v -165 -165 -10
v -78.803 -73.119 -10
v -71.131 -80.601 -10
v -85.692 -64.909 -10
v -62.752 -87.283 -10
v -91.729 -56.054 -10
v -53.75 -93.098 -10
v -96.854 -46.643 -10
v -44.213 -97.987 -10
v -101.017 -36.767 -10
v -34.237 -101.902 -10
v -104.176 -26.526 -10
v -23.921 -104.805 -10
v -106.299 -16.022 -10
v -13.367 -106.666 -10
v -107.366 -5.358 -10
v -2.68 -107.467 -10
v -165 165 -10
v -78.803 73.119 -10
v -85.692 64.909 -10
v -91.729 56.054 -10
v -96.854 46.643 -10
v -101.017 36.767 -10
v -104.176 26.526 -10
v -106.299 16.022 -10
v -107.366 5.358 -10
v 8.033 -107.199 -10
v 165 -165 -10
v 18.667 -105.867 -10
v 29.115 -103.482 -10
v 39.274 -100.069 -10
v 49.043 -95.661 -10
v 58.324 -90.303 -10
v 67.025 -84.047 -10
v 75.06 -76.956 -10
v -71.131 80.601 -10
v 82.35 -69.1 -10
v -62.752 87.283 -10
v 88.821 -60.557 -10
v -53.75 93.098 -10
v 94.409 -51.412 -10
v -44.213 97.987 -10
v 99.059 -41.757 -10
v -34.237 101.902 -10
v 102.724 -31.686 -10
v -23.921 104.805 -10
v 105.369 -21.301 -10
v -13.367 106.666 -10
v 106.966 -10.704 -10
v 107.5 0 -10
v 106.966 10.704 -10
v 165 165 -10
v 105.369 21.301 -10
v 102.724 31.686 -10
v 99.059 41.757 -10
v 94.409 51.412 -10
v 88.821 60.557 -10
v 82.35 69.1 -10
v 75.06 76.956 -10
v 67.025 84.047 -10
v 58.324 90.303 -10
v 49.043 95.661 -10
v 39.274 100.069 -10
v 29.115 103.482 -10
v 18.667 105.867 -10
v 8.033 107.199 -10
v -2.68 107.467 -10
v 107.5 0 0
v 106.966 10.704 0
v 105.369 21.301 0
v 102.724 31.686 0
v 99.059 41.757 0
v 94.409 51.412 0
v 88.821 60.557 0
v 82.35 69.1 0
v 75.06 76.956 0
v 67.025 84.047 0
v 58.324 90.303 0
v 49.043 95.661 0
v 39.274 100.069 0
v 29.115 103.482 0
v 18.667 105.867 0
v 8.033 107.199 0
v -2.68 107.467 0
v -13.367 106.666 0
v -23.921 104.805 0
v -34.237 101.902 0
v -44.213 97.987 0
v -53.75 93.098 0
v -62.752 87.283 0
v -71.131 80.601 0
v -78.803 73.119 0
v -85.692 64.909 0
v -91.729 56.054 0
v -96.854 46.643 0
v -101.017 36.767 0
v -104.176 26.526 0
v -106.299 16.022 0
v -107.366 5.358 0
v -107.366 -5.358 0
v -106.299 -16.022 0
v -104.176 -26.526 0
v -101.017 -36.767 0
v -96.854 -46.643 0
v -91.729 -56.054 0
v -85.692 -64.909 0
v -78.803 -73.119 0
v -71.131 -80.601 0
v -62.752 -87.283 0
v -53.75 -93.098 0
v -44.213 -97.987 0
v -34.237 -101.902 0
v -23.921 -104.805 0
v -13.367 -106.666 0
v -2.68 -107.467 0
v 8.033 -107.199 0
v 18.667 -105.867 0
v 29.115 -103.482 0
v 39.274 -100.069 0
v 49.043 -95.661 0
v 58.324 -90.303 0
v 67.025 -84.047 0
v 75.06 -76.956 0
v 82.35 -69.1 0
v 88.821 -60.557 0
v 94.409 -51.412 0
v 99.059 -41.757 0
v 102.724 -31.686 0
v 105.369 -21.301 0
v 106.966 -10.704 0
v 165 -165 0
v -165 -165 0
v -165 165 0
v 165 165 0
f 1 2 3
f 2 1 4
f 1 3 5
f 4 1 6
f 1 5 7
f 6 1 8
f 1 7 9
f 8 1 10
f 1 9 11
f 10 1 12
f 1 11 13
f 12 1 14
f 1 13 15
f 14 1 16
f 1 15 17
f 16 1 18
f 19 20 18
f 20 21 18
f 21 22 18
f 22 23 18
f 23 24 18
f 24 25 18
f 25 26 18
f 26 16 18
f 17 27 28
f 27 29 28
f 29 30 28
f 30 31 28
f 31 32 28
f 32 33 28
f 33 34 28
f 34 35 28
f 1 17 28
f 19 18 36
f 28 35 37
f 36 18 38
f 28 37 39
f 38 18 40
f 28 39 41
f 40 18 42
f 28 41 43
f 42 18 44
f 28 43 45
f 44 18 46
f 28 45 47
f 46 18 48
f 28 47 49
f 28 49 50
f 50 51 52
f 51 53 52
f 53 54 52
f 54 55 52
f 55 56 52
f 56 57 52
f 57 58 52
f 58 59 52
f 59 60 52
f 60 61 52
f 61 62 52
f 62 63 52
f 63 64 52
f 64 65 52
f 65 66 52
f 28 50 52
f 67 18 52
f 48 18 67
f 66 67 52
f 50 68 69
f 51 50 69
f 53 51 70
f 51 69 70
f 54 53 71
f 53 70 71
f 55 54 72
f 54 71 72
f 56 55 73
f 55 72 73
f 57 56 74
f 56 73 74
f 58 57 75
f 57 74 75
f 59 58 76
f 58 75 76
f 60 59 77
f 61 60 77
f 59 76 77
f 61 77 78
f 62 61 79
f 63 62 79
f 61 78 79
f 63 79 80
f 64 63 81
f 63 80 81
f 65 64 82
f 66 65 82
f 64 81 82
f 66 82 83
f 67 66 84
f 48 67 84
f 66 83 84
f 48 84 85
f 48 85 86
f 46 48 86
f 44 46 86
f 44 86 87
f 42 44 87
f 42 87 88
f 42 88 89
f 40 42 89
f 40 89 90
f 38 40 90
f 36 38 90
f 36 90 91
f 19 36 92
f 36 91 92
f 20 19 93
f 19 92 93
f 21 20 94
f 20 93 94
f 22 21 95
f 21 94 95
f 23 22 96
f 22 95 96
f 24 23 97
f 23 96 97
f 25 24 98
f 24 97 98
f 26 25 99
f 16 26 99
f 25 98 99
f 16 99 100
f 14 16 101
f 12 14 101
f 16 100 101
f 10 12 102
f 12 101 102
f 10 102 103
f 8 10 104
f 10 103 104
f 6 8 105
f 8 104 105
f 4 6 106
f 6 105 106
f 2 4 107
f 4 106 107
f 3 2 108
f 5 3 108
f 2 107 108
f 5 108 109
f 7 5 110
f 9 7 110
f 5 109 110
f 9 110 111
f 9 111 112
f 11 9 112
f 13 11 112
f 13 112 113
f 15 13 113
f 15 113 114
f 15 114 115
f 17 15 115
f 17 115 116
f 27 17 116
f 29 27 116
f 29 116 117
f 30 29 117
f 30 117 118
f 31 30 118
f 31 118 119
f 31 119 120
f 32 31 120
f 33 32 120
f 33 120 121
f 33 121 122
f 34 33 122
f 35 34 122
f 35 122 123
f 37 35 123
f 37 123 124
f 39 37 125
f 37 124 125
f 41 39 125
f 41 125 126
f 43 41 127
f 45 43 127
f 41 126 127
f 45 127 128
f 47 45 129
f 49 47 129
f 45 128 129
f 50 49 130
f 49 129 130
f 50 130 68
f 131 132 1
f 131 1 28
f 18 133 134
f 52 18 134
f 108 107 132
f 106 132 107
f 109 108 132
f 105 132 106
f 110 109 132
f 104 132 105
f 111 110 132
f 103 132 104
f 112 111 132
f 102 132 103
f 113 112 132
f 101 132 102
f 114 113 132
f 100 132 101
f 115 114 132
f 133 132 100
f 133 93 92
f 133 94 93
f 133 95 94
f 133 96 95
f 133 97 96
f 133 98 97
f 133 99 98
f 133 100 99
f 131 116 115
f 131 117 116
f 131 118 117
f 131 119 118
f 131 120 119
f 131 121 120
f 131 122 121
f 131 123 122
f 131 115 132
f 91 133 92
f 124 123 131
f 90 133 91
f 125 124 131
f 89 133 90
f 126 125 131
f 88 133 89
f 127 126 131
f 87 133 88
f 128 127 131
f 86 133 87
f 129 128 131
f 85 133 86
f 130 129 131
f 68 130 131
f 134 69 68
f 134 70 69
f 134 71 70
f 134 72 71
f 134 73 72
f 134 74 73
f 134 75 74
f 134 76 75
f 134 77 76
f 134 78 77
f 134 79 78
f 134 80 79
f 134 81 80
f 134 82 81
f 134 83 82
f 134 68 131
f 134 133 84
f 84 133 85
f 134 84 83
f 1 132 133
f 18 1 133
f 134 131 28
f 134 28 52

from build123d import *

# Parameters (mm, degrees)
SKETCH1_W           = 330
SKETCH1_H           = 330
BOSS_EXTRUDE1_DEPTH = 10
SKETCH2_R           = 107.5
CUT_EXTRUDE1_DEPTH  = 10


with BuildPart() as part:
    # Sketch1 → Boss-Extrude1 (new body)
    with BuildSketch(Plane.XY):
        Rectangle(SKETCH1_W, SKETCH1_H)
    extrude(amount=-BOSS_EXTRUDE1_DEPTH)

    # Sketch2 → Cut-Extrude1 (cut)
    with BuildSketch(Plane.XY):
        Circle(SKETCH2_R)
    extrude(amount=-CUT_EXTRUDE1_DEPTH, mode=Mode.SUBTRACT)


solid = part.part
